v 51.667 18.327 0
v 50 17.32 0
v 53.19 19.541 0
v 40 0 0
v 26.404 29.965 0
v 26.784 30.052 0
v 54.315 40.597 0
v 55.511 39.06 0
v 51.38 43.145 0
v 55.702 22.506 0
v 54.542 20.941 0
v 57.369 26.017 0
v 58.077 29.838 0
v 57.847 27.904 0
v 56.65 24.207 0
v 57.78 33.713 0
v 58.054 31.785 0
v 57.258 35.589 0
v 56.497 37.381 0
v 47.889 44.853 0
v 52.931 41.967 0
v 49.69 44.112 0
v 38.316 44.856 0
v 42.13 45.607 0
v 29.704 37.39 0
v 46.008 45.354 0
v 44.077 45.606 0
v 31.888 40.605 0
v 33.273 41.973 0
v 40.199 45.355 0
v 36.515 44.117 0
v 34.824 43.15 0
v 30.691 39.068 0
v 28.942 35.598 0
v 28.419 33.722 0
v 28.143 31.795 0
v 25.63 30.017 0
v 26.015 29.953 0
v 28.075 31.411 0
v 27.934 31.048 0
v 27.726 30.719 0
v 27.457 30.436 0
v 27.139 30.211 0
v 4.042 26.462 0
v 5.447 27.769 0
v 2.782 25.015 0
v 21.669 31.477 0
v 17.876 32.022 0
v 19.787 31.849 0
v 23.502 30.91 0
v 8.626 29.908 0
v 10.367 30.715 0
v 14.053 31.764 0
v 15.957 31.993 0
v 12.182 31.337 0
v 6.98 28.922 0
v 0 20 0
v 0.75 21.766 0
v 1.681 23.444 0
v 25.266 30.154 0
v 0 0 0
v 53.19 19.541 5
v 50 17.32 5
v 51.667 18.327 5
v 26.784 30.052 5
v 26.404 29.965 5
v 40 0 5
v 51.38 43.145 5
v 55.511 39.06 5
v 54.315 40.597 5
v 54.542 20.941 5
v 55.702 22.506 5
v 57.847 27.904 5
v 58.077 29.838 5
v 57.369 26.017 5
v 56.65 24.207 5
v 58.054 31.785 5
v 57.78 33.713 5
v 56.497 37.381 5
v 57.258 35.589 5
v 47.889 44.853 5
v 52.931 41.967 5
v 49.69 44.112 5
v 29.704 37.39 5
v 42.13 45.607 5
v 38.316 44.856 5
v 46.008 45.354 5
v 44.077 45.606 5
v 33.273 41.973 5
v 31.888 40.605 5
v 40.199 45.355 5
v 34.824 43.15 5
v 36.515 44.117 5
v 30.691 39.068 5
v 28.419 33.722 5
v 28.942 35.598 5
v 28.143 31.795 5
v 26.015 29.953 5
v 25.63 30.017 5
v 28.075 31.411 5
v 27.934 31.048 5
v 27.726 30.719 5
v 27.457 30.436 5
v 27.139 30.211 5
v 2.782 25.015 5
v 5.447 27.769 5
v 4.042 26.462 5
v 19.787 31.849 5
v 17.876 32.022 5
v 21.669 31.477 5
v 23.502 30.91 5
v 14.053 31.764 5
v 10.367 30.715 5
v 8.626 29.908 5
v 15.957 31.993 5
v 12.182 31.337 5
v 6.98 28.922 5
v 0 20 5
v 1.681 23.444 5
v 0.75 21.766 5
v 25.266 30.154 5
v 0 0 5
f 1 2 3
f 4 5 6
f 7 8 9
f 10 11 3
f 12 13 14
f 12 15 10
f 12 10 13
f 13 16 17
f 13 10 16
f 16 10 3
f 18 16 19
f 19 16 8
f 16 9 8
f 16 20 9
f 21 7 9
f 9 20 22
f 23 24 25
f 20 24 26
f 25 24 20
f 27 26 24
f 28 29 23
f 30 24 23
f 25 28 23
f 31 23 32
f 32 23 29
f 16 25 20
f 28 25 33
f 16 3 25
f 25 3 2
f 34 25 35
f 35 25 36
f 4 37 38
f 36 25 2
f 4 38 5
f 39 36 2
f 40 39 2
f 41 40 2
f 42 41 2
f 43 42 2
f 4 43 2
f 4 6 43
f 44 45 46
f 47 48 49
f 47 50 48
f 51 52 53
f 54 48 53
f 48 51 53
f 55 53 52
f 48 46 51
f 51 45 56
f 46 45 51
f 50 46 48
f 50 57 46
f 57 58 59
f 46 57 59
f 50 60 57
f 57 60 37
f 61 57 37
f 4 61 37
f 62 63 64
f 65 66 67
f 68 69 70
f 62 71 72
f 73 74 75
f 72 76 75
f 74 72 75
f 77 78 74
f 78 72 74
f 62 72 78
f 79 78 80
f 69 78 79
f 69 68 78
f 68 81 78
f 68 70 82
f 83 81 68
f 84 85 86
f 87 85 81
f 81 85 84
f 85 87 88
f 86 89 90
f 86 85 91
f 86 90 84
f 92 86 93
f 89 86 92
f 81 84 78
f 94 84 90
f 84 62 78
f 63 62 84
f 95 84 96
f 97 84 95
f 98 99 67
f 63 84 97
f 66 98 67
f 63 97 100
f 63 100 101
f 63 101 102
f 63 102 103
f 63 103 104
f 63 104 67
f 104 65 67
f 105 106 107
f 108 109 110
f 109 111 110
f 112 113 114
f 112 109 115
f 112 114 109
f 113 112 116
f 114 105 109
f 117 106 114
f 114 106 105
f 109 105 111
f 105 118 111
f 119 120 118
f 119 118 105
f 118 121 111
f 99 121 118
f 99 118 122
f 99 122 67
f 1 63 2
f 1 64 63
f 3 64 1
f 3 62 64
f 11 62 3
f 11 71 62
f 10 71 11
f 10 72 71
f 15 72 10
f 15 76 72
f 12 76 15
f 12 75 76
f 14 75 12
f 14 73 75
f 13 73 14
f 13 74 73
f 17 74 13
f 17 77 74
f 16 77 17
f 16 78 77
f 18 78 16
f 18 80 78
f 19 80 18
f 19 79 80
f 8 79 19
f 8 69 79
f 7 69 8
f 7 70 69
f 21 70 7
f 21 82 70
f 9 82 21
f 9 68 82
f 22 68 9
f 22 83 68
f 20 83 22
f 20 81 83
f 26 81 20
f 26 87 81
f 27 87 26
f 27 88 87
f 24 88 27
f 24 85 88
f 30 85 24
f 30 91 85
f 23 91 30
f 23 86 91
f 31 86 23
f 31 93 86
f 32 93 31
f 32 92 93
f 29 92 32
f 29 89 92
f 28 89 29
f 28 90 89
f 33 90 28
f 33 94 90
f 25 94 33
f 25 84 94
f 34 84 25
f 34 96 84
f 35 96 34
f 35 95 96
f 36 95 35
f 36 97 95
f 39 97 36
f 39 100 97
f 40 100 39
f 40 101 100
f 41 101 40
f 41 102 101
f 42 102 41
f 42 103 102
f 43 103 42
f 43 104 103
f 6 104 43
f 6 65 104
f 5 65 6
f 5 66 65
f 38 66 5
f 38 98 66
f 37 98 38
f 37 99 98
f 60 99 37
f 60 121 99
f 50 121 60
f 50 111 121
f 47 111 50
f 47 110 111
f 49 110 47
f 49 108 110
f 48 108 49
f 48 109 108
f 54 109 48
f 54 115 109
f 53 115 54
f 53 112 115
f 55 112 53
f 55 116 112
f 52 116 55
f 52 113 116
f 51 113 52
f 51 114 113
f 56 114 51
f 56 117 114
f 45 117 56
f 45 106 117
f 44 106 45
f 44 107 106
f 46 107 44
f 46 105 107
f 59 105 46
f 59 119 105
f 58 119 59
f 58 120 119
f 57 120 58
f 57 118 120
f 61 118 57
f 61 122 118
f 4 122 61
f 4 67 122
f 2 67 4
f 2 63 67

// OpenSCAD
// Generated by Parametrix
ca_codeExample1_faceExample1_000 = [ [ 0.0000, 0.0000 ],[ 40.0000, 0.0000 ],[ 50.0000, 17.3205 ],[ 51.6671, 18.3268 ],[ 53.1898, 19.5406 ],[ 54.5425, 20.9414 ],[ 55.7022, 22.5056 ],[ 56.6496, 24.2069 ],[ 57.3686, 26.0166 ],[ 57.8471, 27.9042 ],[ 58.0770, 29.8378 ],[ 58.0545, 31.7850 ],[ 57.7799, 33.7128 ],[ 57.2580, 35.5888 ],[ 56.4974, 37.3814 ],[ 55.5109, 39.0604 ],[ 54.3153, 40.5974 ],[ 52.9307, 41.9666 ],[ 51.3803, 43.1448 ],[ 49.6904, 44.1123 ],[ 47.8894, 44.8527 ],[ 46.0076, 45.3536 ],[ 44.0768, 45.6065 ],[ 42.1296, 45.6071 ],[ 40.1986, 45.3555 ],[ 38.3165, 44.8558 ],[ 36.5150, 44.1166 ],[ 34.8245, 43.1502 ],[ 33.2734, 41.9729 ],[ 31.8879, 40.6046 ],[ 30.6913, 39.0684 ],[ 29.7038, 37.3900 ],[ 28.9420, 35.5980 ],[ 28.4188, 33.7223 ],[ 28.1430, 31.7946 ],[ 28.0753, 31.4110 ],[ 27.9345, 31.0477 ],[ 27.7259, 30.7186 ],[ 27.4575, 30.4362 ],[ 27.1394, 30.2113 ],[ 26.7838, 30.0522 ],[ 26.4040, 29.9651 ],[ 26.0146, 29.9533 ],[ 25.6303, 30.0172 ],[ 25.2657, 30.1544 ],[ 23.5022, 30.9103 ],[ 21.6692, 31.4774 ],[ 19.7869, 31.8493 ],[ 17.8760, 32.0219 ],[ 15.9575, 31.9935 ],[ 14.0526, 31.7642 ],[ 12.1821, 31.3367 ],[ 10.3668, 30.7155 ],[ 8.6265, 29.9076 ],[ 6.9804, 28.9219 ],[ 5.4466, 27.7691 ],[ 4.0420, 26.4620 ],[ 2.7821, 25.0149 ],[ 1.6807, 23.4439 ],[ 0.7499, 21.7661 ],[ 0.0000, 20.0000 ],[ 0.0000, 0.0000 ] ];
cb_codeExample1_faceExample1_000 = [  0, 1, 2, 3, 4, 5, 6, 7, 8, 9, 10, 11, 12, 13, 14, 15, 16, 17, 18, 19, 20, 21, 22, 23, 24, 25, 26, 27, 28, 29, 30, 31, 32, 33, 34, 35, 36, 37, 38, 39, 40, 41, 42, 43, 44, 45, 46, 47, 48, 49, 50, 51, 52, 53, 54, 55, 56, 57, 58, 59, 60, 61 ];
a_codeExample1_faceExample1 = concat(ca_codeExample1_faceExample1_000);
b_codeExample1_faceExample1 = [cb_codeExample1_faceExample1_000];

module subpax_codeExample1_example1 () {
	translate( [ 0, 0, 0 ])
		rotate( [ 0, 0, 0 ])
			   linear_extrude(height = 5) polygon(a_codeExample1_faceExample1, b_codeExample1_faceExample1);
}

module pax_codeExample1 () {
	subpax_codeExample1_example1();
}

pax_codeExample1();
